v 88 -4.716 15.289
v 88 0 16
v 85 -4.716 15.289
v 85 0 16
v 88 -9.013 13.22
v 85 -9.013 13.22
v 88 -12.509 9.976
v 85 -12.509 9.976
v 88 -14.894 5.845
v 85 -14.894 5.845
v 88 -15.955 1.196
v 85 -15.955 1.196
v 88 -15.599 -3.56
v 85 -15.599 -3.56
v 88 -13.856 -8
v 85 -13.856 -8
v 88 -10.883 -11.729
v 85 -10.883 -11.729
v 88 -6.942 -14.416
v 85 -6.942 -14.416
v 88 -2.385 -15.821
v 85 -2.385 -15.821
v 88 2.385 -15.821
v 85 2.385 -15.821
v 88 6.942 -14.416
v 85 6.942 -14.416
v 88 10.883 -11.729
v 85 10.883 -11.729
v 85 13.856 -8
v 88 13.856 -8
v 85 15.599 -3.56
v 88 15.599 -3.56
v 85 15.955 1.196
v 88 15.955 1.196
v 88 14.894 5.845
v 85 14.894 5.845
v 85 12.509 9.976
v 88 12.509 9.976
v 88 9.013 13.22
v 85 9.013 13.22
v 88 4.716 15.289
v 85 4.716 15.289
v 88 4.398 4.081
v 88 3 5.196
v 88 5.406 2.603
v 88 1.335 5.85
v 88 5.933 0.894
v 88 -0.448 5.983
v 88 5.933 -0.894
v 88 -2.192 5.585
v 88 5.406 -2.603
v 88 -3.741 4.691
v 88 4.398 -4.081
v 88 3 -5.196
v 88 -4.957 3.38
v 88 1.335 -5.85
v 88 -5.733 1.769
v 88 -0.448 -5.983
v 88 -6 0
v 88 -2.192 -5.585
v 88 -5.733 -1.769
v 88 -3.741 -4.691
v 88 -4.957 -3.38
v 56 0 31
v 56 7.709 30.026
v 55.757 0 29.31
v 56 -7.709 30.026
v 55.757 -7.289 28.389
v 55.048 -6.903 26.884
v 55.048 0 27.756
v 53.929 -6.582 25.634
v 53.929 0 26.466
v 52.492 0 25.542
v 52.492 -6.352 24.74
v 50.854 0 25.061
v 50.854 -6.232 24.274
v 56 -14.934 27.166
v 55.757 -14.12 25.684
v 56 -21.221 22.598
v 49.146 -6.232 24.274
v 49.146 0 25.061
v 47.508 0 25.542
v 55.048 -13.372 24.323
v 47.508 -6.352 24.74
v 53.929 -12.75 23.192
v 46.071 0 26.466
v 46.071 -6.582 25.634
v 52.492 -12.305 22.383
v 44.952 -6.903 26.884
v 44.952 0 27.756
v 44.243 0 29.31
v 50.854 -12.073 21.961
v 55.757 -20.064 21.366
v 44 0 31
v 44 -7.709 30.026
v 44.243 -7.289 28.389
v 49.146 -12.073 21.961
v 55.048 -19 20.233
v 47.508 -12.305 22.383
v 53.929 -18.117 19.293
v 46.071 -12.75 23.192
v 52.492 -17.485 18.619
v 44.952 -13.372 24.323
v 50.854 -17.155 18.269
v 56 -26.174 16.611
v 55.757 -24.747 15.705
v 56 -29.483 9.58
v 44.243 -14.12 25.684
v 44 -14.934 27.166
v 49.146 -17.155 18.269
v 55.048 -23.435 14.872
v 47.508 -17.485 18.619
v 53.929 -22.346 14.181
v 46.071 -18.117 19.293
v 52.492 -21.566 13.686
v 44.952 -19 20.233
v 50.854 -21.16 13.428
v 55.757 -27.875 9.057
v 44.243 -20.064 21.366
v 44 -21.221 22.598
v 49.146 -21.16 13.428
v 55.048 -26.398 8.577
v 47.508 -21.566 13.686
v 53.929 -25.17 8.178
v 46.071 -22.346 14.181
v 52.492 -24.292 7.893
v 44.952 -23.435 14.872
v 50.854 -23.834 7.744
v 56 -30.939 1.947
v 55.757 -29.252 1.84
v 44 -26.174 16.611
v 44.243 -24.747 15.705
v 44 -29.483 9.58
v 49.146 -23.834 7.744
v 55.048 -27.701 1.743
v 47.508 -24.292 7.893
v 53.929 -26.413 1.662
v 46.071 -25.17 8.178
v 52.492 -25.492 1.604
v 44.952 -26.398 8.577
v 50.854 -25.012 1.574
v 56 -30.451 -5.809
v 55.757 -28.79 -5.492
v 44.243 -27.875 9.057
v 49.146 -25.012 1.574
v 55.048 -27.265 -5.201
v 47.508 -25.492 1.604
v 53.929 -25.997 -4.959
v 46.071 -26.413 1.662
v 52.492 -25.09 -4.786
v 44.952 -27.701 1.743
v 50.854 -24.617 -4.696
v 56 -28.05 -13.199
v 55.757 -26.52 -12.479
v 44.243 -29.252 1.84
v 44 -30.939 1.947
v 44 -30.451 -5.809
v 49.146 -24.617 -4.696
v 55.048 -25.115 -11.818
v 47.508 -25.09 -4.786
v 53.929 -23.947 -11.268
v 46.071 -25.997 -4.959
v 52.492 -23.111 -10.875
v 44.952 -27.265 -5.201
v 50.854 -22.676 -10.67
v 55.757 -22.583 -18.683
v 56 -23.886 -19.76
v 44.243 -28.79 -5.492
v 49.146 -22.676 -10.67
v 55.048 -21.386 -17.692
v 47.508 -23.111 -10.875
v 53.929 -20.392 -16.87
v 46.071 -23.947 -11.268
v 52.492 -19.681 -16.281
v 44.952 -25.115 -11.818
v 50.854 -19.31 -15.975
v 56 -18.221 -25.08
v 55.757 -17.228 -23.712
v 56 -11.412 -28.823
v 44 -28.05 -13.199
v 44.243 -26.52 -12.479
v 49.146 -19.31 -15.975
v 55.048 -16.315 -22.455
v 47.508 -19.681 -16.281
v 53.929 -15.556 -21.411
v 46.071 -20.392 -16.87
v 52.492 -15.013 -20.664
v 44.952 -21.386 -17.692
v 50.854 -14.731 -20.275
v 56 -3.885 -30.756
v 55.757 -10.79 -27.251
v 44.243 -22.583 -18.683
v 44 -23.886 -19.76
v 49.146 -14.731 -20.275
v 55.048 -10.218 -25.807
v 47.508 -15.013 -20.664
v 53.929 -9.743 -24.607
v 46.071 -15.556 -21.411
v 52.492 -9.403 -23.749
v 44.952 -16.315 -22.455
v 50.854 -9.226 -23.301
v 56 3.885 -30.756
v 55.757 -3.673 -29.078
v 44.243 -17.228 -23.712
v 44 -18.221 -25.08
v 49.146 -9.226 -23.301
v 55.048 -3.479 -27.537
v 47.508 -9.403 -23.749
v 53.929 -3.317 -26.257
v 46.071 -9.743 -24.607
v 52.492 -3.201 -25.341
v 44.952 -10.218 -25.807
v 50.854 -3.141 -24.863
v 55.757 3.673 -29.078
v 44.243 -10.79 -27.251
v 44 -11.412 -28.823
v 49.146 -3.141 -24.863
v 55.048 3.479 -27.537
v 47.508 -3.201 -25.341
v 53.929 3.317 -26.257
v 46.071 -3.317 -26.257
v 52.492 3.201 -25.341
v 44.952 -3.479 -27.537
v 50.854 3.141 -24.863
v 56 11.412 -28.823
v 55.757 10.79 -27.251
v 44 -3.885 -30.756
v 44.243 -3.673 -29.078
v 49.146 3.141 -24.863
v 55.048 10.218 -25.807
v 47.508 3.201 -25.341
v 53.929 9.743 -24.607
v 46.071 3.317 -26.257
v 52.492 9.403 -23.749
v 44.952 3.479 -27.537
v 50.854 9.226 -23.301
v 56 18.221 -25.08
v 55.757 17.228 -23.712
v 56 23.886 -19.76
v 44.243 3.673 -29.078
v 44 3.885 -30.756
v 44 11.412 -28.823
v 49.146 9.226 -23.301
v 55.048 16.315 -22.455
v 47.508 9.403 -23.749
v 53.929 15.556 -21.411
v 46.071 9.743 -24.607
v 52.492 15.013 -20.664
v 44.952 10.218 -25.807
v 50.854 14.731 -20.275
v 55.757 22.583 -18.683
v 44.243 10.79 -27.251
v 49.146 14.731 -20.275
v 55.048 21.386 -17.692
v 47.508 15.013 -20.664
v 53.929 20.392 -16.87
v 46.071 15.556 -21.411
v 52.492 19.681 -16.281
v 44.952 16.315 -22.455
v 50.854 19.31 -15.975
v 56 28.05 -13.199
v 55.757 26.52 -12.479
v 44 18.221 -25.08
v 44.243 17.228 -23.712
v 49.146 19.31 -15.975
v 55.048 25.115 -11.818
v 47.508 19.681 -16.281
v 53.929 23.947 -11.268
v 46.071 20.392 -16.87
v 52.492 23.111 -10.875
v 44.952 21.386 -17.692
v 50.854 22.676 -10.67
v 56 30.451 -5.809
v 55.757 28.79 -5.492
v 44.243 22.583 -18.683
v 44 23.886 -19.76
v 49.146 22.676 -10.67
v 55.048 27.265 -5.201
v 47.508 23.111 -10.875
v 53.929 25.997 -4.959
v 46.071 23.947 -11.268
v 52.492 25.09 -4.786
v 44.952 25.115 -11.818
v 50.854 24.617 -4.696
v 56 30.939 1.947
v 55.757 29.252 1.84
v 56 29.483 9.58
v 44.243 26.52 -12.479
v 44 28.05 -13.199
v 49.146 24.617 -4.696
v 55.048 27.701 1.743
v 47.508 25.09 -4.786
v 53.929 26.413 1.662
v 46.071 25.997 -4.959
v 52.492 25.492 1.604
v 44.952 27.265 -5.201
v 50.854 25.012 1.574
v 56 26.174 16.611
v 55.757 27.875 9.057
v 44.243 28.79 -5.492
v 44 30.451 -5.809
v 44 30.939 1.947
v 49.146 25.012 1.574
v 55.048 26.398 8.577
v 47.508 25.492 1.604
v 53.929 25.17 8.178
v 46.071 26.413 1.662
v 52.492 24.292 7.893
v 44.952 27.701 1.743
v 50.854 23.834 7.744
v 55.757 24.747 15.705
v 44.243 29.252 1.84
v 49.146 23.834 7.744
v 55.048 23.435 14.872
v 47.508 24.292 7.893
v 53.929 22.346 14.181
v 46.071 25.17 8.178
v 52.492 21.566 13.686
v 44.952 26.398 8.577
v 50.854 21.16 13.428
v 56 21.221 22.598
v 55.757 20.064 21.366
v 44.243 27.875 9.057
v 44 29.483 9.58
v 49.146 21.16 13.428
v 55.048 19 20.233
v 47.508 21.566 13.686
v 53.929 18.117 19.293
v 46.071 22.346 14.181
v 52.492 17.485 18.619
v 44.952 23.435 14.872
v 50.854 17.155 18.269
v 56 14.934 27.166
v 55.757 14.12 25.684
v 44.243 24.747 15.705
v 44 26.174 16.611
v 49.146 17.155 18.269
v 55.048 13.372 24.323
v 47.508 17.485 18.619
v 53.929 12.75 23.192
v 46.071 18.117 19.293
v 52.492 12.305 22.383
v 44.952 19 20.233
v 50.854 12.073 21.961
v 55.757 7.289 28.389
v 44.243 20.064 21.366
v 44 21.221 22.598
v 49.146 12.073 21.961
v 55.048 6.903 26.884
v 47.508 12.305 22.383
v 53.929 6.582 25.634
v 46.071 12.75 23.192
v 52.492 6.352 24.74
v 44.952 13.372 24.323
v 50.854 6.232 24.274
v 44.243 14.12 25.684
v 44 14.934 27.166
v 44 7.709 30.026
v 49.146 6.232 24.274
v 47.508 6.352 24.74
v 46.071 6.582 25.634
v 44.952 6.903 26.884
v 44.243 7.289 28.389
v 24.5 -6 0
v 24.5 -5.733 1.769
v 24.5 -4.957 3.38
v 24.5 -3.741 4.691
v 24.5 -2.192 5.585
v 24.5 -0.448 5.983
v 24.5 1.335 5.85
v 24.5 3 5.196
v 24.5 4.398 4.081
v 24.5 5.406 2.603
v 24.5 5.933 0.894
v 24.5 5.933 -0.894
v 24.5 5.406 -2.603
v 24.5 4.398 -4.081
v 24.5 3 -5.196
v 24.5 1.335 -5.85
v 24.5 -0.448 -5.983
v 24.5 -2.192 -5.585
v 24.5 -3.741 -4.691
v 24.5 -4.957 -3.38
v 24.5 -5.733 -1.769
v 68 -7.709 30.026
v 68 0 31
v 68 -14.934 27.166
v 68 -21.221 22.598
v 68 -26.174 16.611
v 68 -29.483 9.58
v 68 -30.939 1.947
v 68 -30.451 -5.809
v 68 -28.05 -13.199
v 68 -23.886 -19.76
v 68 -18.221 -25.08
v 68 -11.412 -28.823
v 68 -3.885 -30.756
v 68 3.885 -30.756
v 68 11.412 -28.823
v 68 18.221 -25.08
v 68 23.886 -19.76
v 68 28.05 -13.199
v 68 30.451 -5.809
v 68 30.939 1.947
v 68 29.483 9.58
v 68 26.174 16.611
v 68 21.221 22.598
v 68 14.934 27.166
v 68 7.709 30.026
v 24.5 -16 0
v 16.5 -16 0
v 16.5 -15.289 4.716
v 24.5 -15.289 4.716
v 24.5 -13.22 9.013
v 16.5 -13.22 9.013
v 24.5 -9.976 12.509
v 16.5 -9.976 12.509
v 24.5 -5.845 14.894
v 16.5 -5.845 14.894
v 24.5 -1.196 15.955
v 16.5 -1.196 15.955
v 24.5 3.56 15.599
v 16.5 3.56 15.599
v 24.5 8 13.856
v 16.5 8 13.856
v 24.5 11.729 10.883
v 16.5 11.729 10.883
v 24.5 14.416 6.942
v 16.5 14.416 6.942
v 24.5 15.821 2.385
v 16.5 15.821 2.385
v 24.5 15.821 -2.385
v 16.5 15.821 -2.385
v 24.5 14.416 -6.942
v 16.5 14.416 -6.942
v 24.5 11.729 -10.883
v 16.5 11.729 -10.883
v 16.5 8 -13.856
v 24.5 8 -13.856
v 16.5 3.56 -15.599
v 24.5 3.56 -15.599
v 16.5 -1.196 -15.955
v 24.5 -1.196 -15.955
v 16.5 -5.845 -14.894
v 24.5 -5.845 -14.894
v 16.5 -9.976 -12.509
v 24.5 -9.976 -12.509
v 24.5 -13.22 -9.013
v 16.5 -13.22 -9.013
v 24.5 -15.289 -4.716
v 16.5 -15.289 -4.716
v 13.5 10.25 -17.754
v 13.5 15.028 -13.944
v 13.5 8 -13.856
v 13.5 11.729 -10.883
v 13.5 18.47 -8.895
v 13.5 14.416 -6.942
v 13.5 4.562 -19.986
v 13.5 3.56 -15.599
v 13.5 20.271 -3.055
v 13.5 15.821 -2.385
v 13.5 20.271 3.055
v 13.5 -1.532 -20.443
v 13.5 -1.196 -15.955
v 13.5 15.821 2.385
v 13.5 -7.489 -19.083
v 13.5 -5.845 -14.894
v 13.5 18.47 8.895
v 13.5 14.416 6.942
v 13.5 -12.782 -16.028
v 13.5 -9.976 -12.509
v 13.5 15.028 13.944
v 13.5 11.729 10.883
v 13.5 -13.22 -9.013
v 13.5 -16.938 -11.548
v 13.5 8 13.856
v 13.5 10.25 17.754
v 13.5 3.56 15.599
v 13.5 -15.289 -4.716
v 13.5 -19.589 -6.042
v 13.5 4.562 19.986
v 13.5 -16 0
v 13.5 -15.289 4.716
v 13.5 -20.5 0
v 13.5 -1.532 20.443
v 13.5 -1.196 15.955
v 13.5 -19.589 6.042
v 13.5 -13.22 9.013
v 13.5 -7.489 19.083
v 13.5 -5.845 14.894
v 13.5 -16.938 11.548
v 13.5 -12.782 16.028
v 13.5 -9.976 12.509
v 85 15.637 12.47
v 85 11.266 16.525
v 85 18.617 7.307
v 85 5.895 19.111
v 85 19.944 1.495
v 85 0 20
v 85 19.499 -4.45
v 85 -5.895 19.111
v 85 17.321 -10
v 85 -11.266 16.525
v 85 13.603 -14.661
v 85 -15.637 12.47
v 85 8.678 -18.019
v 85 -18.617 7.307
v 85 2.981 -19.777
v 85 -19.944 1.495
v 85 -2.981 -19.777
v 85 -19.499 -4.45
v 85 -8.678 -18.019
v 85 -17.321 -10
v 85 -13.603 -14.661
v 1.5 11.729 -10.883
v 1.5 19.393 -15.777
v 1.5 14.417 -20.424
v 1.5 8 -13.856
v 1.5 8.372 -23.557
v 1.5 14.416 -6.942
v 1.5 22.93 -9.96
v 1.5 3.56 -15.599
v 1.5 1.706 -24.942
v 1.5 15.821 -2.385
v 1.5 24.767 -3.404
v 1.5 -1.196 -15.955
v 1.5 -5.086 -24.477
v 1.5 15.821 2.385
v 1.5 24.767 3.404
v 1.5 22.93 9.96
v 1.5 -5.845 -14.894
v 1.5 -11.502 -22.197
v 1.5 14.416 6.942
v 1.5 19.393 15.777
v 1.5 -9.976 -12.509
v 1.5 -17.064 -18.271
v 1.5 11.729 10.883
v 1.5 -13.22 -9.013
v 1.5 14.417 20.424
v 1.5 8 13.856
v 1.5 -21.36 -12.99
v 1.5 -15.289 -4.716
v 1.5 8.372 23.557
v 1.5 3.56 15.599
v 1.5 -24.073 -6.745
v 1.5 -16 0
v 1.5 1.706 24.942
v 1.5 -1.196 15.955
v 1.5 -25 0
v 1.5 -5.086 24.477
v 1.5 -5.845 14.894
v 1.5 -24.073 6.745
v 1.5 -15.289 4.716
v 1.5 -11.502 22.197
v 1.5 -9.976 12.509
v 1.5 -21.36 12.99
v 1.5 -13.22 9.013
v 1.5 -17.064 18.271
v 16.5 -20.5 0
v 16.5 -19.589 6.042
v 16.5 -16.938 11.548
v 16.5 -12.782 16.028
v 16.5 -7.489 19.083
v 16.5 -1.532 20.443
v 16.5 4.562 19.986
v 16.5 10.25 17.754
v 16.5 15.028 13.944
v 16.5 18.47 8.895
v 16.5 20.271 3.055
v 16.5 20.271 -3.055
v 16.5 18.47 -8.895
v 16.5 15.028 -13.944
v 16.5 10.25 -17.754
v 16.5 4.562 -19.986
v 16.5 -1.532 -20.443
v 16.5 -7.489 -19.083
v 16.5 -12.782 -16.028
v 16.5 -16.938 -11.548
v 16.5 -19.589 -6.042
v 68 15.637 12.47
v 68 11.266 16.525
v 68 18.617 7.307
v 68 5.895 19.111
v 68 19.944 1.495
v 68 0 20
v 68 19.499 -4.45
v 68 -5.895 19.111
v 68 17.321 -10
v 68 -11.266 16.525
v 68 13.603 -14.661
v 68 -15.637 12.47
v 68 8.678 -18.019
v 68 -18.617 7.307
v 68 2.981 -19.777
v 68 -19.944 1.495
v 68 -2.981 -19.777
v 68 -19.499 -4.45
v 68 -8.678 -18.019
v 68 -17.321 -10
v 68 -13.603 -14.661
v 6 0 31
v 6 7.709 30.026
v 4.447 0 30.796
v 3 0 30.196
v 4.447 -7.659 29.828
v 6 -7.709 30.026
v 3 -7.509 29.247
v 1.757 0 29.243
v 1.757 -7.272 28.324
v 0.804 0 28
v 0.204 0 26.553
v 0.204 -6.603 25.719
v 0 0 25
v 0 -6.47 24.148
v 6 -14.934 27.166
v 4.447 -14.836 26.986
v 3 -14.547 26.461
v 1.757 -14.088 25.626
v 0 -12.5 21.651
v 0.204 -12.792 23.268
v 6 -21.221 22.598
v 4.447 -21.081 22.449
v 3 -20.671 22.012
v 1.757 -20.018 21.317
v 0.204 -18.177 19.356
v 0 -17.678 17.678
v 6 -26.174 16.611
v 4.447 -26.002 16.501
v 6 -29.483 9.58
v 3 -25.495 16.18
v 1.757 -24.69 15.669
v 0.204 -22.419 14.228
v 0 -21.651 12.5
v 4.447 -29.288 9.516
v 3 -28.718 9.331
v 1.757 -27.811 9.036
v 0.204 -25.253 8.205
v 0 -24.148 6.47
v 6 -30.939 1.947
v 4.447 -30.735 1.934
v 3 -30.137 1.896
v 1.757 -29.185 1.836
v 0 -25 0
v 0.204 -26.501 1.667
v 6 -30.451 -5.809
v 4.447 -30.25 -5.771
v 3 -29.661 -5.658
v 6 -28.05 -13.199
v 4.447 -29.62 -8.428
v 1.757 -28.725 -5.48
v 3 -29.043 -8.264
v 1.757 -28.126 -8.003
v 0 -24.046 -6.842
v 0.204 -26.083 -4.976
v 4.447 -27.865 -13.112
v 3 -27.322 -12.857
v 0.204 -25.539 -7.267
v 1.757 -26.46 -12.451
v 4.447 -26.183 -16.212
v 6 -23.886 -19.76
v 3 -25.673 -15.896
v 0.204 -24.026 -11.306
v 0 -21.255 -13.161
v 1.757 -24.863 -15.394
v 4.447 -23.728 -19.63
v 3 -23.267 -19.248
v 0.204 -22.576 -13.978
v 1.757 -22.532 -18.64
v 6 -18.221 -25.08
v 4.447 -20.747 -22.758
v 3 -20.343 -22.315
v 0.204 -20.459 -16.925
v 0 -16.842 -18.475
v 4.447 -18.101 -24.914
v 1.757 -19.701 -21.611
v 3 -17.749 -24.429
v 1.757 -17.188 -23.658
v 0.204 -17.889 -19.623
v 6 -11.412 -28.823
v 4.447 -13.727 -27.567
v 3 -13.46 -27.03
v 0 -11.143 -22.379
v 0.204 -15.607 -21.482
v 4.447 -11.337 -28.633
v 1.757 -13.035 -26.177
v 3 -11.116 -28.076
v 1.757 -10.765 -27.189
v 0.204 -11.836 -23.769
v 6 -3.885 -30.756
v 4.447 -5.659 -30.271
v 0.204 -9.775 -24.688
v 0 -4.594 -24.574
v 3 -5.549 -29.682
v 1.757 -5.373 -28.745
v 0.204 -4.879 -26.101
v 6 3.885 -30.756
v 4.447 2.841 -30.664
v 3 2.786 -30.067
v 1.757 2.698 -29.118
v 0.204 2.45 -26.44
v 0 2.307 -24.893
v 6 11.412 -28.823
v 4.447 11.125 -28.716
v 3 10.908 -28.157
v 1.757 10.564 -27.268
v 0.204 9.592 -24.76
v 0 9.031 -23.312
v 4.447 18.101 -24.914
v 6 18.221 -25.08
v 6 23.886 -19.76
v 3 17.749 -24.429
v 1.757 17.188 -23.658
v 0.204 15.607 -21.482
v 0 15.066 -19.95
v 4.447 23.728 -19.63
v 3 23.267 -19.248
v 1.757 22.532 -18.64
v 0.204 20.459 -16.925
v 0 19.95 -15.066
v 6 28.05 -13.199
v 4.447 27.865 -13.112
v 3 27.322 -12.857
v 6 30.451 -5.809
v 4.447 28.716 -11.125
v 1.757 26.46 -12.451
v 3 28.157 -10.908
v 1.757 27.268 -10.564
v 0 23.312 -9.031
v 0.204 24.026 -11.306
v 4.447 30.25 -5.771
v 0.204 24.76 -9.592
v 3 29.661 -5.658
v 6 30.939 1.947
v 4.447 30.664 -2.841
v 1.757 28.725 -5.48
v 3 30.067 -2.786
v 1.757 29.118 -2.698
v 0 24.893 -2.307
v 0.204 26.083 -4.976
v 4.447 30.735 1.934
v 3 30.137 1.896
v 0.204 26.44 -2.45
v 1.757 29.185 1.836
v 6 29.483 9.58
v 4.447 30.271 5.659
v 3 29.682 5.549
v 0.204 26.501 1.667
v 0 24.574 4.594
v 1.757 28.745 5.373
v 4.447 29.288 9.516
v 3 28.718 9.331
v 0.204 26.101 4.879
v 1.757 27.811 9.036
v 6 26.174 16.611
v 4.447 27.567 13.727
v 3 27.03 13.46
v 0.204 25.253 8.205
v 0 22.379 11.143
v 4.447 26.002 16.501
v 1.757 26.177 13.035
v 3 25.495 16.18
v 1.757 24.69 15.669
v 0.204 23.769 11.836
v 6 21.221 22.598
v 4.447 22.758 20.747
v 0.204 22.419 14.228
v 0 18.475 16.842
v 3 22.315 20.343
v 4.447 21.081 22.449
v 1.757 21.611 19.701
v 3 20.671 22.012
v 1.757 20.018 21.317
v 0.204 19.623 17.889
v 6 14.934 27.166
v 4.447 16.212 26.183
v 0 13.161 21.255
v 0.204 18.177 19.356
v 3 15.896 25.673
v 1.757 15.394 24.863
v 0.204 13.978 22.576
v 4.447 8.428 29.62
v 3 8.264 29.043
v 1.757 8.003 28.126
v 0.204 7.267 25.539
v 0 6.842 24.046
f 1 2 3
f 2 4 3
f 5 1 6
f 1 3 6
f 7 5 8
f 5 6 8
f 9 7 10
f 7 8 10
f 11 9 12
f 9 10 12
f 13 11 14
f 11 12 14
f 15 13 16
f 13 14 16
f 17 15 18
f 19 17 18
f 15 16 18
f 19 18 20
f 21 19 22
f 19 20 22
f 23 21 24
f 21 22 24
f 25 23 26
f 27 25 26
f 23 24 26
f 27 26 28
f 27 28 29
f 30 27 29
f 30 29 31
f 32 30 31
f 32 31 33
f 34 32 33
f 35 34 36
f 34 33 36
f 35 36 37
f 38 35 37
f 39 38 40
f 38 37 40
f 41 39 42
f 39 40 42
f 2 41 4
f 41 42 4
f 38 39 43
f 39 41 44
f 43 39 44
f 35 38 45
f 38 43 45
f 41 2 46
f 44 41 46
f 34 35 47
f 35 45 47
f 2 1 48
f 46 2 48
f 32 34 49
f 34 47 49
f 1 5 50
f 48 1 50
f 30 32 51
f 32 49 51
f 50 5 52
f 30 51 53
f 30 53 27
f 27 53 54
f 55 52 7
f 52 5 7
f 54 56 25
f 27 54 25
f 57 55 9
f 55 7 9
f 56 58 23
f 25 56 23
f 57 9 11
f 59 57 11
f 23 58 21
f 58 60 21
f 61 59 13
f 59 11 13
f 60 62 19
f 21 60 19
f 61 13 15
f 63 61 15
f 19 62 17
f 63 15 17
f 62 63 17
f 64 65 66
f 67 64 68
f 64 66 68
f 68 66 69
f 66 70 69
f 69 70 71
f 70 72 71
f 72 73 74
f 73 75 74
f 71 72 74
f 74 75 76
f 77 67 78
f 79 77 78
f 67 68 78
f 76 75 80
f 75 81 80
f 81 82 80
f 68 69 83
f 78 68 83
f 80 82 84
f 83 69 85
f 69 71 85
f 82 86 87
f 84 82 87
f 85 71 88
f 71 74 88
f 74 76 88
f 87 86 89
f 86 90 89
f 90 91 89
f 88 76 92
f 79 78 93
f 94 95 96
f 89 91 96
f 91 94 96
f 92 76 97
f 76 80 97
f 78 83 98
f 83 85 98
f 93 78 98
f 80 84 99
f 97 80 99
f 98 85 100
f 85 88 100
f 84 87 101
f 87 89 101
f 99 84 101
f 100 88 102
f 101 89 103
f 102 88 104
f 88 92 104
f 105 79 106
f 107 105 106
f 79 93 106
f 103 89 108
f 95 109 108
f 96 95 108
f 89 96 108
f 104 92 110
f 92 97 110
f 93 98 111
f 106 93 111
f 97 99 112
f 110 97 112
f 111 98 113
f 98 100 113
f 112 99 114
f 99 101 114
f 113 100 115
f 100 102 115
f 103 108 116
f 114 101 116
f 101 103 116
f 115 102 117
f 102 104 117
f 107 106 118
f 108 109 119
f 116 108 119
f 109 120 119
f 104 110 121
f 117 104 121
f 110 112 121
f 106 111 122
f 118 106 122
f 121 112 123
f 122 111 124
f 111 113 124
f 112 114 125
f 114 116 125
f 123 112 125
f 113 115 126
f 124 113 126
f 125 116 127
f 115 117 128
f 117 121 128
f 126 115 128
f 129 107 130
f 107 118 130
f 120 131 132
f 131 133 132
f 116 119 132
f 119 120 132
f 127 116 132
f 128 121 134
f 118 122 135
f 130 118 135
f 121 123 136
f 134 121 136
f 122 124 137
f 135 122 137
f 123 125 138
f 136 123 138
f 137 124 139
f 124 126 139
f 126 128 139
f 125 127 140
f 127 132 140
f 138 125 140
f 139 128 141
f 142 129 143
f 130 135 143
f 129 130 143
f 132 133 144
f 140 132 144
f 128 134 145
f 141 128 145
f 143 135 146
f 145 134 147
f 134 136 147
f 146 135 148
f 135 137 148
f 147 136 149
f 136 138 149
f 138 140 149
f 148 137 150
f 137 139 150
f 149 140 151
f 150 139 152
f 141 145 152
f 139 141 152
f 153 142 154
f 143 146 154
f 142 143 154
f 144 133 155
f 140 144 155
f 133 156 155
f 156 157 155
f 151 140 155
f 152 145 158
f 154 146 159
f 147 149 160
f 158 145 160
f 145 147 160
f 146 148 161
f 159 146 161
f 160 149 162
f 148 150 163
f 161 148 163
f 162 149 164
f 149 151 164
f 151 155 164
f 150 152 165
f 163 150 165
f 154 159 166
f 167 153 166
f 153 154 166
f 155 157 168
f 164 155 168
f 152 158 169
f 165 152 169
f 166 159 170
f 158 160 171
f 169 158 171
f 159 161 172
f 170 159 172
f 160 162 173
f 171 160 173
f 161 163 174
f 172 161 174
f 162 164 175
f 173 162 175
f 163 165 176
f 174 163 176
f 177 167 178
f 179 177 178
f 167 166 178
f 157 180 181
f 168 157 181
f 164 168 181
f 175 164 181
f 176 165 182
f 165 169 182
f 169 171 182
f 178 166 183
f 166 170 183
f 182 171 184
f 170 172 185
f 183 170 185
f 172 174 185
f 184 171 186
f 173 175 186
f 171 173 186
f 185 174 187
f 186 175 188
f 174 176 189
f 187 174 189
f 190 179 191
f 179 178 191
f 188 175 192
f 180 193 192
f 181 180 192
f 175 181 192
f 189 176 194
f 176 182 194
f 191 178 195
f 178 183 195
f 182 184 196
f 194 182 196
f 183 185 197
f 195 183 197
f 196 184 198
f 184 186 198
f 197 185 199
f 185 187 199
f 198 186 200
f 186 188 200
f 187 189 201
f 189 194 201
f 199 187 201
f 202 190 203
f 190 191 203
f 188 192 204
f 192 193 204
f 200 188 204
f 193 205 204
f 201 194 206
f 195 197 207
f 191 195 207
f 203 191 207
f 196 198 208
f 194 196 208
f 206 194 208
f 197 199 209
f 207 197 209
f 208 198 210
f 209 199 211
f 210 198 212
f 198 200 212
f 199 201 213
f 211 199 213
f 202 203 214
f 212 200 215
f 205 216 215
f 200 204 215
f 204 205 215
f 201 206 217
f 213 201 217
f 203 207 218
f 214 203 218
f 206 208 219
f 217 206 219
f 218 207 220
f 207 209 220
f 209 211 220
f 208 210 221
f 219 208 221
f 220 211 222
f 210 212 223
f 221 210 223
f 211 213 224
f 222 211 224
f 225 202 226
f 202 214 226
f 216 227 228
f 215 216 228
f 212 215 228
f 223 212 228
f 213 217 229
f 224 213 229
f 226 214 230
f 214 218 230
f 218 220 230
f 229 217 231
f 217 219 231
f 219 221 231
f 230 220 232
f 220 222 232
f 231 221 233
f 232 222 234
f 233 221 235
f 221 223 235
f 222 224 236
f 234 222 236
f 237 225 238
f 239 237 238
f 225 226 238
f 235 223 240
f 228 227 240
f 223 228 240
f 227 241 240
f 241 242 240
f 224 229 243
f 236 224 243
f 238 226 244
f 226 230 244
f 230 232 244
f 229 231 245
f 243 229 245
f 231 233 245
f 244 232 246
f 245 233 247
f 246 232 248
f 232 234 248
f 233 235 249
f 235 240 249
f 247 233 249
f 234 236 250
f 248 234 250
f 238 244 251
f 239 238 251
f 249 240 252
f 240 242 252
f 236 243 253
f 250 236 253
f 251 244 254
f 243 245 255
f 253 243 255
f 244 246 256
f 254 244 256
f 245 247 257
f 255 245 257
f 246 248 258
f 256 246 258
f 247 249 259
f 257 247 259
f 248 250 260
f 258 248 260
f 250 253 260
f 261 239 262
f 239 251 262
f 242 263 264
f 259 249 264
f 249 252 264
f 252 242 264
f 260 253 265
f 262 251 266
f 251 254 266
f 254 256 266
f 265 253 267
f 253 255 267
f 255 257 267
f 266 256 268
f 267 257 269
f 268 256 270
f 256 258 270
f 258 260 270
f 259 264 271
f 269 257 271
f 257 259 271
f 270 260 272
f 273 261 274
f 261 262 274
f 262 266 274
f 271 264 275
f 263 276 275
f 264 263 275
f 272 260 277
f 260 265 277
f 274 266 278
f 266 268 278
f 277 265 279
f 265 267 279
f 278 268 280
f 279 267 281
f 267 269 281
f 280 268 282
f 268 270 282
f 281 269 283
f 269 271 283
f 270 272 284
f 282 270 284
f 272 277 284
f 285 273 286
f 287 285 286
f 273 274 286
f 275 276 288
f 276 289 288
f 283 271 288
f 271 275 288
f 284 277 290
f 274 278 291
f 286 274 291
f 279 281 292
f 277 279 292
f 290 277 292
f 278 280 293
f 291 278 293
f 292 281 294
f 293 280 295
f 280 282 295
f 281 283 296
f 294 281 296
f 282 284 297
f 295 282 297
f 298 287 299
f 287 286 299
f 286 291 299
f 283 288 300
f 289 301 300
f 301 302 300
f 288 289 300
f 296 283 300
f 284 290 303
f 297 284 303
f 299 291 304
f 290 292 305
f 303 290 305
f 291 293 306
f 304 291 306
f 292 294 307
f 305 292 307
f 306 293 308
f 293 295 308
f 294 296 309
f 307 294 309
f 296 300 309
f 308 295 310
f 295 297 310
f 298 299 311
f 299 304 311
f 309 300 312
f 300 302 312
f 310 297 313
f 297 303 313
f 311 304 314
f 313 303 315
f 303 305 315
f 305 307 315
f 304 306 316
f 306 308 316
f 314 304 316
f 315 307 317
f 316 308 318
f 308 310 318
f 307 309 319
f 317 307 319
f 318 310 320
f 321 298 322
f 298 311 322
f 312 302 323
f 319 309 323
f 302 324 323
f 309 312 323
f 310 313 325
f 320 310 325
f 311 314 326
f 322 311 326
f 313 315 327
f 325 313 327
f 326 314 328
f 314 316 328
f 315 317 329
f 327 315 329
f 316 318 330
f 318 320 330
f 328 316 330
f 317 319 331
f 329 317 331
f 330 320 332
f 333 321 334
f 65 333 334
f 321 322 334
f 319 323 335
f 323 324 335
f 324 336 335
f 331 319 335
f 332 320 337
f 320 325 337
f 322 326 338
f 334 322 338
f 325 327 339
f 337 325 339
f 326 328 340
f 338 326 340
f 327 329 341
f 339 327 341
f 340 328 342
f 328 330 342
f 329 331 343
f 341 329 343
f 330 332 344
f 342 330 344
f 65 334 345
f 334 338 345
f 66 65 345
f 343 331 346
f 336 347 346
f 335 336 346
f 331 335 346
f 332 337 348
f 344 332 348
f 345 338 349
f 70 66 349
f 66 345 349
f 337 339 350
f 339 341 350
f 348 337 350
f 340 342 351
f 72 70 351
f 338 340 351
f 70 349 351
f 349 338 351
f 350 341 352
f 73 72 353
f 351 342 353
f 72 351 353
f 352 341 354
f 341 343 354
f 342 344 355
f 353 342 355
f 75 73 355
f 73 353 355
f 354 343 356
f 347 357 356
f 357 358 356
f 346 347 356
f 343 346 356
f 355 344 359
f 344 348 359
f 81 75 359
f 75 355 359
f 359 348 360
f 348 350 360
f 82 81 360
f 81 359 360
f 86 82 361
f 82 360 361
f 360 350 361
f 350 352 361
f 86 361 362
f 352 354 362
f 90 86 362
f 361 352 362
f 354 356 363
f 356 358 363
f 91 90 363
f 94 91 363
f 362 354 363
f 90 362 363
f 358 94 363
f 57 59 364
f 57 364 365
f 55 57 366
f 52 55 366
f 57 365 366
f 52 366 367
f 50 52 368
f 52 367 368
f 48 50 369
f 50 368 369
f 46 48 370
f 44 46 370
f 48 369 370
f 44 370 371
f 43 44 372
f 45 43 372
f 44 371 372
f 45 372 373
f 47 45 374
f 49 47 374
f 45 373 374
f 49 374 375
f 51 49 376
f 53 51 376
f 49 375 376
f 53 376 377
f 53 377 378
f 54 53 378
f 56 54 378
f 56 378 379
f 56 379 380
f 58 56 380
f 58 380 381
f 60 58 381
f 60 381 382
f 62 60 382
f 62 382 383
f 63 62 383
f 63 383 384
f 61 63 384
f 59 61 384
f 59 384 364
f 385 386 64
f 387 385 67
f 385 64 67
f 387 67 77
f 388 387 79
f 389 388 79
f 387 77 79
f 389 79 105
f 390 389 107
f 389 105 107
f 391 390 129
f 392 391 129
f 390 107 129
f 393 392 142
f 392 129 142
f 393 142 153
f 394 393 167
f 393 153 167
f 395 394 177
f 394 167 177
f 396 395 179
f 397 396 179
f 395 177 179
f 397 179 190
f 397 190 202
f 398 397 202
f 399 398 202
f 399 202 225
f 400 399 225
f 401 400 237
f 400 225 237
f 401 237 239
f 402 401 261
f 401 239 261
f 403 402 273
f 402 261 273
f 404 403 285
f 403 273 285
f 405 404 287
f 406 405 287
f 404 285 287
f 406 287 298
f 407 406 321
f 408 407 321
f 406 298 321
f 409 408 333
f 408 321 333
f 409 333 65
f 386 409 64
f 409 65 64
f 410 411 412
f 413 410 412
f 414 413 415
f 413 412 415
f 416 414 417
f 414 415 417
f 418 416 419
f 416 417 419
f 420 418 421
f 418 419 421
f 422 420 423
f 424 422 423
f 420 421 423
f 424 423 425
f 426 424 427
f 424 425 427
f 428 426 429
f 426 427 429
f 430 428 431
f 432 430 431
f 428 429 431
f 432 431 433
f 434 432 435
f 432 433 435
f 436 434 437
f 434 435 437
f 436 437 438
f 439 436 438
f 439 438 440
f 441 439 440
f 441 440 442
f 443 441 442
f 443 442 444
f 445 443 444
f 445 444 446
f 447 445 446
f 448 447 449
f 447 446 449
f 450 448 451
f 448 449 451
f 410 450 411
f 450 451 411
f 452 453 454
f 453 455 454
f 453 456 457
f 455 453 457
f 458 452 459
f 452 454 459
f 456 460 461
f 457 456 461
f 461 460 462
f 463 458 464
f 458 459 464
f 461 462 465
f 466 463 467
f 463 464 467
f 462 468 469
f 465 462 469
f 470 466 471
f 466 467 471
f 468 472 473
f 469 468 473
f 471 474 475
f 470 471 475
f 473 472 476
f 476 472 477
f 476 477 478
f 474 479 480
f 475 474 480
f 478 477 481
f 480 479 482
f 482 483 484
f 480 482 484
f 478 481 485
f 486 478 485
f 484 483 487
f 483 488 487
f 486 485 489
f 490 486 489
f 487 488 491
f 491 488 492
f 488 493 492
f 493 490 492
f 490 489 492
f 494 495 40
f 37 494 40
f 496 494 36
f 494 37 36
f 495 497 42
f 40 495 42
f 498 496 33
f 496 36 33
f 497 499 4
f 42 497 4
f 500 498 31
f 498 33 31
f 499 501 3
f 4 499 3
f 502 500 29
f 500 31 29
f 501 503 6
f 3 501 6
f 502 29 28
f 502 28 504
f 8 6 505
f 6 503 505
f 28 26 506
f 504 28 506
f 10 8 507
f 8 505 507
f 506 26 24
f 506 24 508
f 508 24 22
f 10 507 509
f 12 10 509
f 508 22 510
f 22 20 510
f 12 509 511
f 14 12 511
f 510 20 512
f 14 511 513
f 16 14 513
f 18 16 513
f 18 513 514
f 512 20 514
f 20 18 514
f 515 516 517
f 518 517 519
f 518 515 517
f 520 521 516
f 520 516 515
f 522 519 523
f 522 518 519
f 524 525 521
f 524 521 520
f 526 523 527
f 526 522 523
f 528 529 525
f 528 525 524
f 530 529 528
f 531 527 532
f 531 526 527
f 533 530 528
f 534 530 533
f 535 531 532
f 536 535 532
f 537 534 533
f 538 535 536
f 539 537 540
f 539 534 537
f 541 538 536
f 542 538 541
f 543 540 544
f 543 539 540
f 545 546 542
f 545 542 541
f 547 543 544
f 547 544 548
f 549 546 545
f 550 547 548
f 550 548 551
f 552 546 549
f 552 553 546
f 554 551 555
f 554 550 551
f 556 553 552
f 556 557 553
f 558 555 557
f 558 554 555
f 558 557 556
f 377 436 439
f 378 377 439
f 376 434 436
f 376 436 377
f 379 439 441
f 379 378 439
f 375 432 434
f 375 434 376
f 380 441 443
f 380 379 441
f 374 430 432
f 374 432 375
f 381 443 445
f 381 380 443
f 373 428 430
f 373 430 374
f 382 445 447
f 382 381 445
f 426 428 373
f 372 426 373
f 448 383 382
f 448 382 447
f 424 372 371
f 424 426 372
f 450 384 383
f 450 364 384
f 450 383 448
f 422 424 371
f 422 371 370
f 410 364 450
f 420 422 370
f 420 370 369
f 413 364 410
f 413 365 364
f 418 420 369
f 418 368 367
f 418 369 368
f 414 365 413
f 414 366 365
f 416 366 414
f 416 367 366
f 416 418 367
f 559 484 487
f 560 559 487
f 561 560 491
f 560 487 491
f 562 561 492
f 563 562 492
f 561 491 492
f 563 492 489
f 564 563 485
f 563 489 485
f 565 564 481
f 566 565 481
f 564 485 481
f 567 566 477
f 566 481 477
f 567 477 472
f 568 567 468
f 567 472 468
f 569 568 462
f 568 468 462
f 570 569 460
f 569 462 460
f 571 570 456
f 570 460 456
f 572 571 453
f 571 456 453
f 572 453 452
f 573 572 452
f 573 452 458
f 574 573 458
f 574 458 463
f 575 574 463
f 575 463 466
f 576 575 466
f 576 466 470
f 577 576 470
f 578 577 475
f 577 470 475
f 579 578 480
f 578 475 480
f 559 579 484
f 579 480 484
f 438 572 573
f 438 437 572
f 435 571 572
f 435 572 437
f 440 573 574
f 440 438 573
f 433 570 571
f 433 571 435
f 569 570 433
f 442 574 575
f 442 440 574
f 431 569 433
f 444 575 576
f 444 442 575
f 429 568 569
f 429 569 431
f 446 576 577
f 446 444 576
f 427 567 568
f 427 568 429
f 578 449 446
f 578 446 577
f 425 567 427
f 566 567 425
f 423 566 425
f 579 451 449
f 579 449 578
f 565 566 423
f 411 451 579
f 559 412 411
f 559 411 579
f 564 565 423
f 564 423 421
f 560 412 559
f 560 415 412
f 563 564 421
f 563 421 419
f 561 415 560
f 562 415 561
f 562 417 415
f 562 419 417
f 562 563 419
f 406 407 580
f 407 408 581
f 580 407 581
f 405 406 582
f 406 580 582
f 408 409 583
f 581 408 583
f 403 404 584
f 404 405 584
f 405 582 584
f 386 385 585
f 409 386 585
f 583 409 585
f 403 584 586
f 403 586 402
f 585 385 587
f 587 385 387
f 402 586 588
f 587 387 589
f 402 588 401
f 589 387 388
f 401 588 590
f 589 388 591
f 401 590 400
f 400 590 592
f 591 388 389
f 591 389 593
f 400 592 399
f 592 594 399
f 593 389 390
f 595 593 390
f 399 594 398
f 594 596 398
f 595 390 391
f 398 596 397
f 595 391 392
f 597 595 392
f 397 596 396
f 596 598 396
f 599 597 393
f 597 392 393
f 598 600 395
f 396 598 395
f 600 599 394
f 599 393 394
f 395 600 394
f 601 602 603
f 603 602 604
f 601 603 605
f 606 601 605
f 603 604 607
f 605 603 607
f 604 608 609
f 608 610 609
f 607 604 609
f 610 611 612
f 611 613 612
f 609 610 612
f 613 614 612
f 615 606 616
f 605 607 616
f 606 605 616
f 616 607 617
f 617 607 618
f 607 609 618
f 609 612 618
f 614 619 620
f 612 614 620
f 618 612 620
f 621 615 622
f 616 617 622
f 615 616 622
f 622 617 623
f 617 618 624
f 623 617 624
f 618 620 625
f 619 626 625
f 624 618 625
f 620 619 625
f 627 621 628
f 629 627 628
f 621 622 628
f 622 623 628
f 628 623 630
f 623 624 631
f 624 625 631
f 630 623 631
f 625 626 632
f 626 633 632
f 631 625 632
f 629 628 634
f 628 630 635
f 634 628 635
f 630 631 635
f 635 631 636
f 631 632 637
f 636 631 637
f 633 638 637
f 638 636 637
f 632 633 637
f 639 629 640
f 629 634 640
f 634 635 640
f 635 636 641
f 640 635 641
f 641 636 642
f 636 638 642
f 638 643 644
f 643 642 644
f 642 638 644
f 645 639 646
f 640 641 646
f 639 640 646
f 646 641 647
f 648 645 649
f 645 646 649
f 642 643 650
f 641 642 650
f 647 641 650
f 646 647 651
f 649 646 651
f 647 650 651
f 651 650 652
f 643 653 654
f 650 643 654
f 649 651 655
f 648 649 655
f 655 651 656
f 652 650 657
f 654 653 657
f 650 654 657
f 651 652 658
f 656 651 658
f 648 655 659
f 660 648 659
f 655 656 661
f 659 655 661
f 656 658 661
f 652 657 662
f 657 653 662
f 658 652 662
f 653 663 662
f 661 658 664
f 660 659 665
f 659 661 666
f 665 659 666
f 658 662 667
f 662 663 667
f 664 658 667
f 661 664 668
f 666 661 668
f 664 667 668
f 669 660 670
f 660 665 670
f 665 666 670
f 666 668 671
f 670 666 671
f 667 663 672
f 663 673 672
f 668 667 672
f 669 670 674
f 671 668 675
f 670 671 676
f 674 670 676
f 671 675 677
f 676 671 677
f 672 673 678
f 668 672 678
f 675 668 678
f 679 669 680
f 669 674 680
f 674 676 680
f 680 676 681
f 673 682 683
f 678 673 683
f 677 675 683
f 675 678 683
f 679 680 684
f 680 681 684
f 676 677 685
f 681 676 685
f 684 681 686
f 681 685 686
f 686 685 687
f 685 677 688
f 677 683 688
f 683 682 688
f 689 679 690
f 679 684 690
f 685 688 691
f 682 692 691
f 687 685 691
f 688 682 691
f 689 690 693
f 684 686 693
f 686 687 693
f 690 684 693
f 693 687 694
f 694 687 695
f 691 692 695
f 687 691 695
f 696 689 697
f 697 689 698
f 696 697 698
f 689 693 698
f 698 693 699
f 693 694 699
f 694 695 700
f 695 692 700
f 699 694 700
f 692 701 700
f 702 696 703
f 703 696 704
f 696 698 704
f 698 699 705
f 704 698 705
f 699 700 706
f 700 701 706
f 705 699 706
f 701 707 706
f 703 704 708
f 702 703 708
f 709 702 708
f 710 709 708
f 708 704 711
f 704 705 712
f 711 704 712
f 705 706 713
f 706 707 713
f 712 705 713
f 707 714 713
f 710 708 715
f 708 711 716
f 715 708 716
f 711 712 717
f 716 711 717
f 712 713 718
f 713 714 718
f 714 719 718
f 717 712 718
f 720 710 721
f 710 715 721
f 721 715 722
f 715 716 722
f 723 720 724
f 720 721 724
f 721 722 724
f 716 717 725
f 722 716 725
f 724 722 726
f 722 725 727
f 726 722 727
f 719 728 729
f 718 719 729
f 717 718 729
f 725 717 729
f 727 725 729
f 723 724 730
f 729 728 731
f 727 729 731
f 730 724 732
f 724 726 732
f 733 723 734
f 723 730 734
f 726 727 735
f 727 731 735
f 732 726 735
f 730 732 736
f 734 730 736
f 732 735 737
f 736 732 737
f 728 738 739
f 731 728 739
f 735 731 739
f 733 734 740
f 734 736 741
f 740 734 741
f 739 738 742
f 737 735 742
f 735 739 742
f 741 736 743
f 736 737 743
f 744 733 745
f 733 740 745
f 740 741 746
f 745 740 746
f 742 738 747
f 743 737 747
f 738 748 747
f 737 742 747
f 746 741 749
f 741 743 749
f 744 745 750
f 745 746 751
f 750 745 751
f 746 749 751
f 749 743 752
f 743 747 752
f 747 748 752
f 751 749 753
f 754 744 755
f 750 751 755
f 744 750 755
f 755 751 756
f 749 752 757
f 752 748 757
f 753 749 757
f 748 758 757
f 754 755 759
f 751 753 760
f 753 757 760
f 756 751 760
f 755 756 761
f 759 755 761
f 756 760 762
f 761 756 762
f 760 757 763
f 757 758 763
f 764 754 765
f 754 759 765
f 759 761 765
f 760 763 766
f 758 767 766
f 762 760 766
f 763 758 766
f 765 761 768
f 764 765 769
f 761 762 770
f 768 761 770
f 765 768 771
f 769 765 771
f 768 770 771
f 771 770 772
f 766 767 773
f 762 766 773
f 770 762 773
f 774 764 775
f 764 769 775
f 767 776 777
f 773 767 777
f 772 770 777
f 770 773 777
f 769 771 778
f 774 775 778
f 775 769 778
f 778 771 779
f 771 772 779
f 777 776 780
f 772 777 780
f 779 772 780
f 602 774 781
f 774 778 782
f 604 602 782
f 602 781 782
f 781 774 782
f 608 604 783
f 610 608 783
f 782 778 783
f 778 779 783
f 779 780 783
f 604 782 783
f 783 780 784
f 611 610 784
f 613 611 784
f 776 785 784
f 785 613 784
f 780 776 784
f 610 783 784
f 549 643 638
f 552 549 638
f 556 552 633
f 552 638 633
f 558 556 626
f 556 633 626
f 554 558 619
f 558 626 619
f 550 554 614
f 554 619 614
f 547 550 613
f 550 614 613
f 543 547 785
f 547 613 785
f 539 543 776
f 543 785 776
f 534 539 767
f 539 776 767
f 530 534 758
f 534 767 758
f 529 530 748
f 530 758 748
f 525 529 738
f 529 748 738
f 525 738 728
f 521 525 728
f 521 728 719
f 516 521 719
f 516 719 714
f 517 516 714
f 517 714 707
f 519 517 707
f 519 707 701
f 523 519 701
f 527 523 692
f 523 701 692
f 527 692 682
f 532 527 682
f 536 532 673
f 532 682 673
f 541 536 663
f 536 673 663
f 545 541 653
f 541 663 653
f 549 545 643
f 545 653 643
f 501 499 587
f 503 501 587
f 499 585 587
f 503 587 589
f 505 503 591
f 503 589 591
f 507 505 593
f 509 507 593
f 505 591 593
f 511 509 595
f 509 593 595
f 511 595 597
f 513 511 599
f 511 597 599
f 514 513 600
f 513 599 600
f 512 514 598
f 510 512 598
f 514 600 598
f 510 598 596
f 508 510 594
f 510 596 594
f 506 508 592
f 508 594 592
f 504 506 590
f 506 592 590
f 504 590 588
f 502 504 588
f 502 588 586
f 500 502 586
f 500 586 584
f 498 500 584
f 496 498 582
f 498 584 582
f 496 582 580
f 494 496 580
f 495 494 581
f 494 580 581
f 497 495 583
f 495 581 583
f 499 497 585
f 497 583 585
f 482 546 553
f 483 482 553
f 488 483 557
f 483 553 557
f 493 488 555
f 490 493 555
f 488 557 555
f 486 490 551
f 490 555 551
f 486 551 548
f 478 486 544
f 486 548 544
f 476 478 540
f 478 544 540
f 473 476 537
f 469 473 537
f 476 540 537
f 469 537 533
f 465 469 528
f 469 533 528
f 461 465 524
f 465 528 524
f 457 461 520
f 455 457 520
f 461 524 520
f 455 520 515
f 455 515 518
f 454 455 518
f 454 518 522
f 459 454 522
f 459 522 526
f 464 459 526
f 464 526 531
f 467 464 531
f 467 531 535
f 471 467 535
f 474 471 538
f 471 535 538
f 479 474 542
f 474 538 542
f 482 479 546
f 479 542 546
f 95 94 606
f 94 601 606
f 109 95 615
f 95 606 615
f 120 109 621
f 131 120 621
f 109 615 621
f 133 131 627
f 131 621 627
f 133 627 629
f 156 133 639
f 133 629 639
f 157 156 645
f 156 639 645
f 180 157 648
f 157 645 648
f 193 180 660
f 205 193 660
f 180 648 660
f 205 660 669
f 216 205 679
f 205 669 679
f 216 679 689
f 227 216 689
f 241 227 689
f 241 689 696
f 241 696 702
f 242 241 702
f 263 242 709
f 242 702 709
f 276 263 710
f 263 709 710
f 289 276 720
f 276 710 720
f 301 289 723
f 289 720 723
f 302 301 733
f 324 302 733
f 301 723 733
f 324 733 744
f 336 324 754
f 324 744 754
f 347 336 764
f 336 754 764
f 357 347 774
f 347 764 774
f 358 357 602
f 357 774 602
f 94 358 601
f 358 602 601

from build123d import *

# Parameters (mm, degrees)
F2_R      = 25
F3_DEPTH  = 1.5
F4_R      = 16
F5_DEPTH  = 12
F6_R      = 20.5
F7_DEPTH  = 3
F8_R      = 16
F9_DEPTH  = 8
F10_R     = 6
F11_DEPTH = 63.501


with BuildPart() as f1:
    # F0 (on Front) → F1 (revolve)
    with BuildSketch(Plane.XZ):
        with BuildLine():
            Line((0, 25), (0, 0))
            Line((0, 0), (88, 0))
            Line((88, 0), (88, 16))
            Line((88, 16), (85, 16))
            Line((85, 16), (85, 20))
            Line((85, 20), (68, 20))
            Line((68, 20), (68, 31))
            Line((68, 31), (56, 31))
            ThreePointArc((56, 31), (50, 25), (44, 31))
            Line((44, 31), (6, 31))
            ThreePointArc((6, 31), (1.7573593129, 29.2426406871), (0, 25))
        make_face()
    revolve(axis=Axis((44, 0, 0), (1, 0, 0)))

    # F2 (on face) → F3 (cut)
    with BuildSketch(Plane(origin=(0, 0, 0), x_dir=(0, -1, 0), z_dir=(-1, 0, 0))):
        Circle(F2_R)
    extrude(amount=-F3_DEPTH, mode=Mode.SUBTRACT)

    # F4 (on face) → F5 (cut)
    with BuildSketch(Plane(origin=(1.5, 0, 0), x_dir=(0, -1, 0), z_dir=(-1, 0, 0))):
        Circle(F4_R)
    extrude(amount=-F5_DEPTH, mode=Mode.SUBTRACT)

    # F6 (on face) → F7 (cut)
    with BuildSketch(Plane(origin=(13.5, 0, 0), x_dir=(0, -1, 0), z_dir=(-1, 0, 0))):
        Circle(F6_R)
    extrude(amount=-F7_DEPTH, mode=Mode.SUBTRACT)

    # F8 (on face) → F9 (cut)
    with BuildSketch(Plane(origin=(16.5, 0, 0), x_dir=(0, -1, 0), z_dir=(-1, 0, 0))):
        Circle(F8_R)
    extrude(amount=-F9_DEPTH, mode=Mode.SUBTRACT)

    # F10 (on face) → F11 (cut, through all)
    with BuildSketch(Plane(origin=(24.5, 0, 0), x_dir=(0, -1, 0), z_dir=(-1, 0, 0))):
        Circle(F10_R)
    extrude(amount=-F11_DEPTH, mode=Mode.SUBTRACT)


solid = f1.part
